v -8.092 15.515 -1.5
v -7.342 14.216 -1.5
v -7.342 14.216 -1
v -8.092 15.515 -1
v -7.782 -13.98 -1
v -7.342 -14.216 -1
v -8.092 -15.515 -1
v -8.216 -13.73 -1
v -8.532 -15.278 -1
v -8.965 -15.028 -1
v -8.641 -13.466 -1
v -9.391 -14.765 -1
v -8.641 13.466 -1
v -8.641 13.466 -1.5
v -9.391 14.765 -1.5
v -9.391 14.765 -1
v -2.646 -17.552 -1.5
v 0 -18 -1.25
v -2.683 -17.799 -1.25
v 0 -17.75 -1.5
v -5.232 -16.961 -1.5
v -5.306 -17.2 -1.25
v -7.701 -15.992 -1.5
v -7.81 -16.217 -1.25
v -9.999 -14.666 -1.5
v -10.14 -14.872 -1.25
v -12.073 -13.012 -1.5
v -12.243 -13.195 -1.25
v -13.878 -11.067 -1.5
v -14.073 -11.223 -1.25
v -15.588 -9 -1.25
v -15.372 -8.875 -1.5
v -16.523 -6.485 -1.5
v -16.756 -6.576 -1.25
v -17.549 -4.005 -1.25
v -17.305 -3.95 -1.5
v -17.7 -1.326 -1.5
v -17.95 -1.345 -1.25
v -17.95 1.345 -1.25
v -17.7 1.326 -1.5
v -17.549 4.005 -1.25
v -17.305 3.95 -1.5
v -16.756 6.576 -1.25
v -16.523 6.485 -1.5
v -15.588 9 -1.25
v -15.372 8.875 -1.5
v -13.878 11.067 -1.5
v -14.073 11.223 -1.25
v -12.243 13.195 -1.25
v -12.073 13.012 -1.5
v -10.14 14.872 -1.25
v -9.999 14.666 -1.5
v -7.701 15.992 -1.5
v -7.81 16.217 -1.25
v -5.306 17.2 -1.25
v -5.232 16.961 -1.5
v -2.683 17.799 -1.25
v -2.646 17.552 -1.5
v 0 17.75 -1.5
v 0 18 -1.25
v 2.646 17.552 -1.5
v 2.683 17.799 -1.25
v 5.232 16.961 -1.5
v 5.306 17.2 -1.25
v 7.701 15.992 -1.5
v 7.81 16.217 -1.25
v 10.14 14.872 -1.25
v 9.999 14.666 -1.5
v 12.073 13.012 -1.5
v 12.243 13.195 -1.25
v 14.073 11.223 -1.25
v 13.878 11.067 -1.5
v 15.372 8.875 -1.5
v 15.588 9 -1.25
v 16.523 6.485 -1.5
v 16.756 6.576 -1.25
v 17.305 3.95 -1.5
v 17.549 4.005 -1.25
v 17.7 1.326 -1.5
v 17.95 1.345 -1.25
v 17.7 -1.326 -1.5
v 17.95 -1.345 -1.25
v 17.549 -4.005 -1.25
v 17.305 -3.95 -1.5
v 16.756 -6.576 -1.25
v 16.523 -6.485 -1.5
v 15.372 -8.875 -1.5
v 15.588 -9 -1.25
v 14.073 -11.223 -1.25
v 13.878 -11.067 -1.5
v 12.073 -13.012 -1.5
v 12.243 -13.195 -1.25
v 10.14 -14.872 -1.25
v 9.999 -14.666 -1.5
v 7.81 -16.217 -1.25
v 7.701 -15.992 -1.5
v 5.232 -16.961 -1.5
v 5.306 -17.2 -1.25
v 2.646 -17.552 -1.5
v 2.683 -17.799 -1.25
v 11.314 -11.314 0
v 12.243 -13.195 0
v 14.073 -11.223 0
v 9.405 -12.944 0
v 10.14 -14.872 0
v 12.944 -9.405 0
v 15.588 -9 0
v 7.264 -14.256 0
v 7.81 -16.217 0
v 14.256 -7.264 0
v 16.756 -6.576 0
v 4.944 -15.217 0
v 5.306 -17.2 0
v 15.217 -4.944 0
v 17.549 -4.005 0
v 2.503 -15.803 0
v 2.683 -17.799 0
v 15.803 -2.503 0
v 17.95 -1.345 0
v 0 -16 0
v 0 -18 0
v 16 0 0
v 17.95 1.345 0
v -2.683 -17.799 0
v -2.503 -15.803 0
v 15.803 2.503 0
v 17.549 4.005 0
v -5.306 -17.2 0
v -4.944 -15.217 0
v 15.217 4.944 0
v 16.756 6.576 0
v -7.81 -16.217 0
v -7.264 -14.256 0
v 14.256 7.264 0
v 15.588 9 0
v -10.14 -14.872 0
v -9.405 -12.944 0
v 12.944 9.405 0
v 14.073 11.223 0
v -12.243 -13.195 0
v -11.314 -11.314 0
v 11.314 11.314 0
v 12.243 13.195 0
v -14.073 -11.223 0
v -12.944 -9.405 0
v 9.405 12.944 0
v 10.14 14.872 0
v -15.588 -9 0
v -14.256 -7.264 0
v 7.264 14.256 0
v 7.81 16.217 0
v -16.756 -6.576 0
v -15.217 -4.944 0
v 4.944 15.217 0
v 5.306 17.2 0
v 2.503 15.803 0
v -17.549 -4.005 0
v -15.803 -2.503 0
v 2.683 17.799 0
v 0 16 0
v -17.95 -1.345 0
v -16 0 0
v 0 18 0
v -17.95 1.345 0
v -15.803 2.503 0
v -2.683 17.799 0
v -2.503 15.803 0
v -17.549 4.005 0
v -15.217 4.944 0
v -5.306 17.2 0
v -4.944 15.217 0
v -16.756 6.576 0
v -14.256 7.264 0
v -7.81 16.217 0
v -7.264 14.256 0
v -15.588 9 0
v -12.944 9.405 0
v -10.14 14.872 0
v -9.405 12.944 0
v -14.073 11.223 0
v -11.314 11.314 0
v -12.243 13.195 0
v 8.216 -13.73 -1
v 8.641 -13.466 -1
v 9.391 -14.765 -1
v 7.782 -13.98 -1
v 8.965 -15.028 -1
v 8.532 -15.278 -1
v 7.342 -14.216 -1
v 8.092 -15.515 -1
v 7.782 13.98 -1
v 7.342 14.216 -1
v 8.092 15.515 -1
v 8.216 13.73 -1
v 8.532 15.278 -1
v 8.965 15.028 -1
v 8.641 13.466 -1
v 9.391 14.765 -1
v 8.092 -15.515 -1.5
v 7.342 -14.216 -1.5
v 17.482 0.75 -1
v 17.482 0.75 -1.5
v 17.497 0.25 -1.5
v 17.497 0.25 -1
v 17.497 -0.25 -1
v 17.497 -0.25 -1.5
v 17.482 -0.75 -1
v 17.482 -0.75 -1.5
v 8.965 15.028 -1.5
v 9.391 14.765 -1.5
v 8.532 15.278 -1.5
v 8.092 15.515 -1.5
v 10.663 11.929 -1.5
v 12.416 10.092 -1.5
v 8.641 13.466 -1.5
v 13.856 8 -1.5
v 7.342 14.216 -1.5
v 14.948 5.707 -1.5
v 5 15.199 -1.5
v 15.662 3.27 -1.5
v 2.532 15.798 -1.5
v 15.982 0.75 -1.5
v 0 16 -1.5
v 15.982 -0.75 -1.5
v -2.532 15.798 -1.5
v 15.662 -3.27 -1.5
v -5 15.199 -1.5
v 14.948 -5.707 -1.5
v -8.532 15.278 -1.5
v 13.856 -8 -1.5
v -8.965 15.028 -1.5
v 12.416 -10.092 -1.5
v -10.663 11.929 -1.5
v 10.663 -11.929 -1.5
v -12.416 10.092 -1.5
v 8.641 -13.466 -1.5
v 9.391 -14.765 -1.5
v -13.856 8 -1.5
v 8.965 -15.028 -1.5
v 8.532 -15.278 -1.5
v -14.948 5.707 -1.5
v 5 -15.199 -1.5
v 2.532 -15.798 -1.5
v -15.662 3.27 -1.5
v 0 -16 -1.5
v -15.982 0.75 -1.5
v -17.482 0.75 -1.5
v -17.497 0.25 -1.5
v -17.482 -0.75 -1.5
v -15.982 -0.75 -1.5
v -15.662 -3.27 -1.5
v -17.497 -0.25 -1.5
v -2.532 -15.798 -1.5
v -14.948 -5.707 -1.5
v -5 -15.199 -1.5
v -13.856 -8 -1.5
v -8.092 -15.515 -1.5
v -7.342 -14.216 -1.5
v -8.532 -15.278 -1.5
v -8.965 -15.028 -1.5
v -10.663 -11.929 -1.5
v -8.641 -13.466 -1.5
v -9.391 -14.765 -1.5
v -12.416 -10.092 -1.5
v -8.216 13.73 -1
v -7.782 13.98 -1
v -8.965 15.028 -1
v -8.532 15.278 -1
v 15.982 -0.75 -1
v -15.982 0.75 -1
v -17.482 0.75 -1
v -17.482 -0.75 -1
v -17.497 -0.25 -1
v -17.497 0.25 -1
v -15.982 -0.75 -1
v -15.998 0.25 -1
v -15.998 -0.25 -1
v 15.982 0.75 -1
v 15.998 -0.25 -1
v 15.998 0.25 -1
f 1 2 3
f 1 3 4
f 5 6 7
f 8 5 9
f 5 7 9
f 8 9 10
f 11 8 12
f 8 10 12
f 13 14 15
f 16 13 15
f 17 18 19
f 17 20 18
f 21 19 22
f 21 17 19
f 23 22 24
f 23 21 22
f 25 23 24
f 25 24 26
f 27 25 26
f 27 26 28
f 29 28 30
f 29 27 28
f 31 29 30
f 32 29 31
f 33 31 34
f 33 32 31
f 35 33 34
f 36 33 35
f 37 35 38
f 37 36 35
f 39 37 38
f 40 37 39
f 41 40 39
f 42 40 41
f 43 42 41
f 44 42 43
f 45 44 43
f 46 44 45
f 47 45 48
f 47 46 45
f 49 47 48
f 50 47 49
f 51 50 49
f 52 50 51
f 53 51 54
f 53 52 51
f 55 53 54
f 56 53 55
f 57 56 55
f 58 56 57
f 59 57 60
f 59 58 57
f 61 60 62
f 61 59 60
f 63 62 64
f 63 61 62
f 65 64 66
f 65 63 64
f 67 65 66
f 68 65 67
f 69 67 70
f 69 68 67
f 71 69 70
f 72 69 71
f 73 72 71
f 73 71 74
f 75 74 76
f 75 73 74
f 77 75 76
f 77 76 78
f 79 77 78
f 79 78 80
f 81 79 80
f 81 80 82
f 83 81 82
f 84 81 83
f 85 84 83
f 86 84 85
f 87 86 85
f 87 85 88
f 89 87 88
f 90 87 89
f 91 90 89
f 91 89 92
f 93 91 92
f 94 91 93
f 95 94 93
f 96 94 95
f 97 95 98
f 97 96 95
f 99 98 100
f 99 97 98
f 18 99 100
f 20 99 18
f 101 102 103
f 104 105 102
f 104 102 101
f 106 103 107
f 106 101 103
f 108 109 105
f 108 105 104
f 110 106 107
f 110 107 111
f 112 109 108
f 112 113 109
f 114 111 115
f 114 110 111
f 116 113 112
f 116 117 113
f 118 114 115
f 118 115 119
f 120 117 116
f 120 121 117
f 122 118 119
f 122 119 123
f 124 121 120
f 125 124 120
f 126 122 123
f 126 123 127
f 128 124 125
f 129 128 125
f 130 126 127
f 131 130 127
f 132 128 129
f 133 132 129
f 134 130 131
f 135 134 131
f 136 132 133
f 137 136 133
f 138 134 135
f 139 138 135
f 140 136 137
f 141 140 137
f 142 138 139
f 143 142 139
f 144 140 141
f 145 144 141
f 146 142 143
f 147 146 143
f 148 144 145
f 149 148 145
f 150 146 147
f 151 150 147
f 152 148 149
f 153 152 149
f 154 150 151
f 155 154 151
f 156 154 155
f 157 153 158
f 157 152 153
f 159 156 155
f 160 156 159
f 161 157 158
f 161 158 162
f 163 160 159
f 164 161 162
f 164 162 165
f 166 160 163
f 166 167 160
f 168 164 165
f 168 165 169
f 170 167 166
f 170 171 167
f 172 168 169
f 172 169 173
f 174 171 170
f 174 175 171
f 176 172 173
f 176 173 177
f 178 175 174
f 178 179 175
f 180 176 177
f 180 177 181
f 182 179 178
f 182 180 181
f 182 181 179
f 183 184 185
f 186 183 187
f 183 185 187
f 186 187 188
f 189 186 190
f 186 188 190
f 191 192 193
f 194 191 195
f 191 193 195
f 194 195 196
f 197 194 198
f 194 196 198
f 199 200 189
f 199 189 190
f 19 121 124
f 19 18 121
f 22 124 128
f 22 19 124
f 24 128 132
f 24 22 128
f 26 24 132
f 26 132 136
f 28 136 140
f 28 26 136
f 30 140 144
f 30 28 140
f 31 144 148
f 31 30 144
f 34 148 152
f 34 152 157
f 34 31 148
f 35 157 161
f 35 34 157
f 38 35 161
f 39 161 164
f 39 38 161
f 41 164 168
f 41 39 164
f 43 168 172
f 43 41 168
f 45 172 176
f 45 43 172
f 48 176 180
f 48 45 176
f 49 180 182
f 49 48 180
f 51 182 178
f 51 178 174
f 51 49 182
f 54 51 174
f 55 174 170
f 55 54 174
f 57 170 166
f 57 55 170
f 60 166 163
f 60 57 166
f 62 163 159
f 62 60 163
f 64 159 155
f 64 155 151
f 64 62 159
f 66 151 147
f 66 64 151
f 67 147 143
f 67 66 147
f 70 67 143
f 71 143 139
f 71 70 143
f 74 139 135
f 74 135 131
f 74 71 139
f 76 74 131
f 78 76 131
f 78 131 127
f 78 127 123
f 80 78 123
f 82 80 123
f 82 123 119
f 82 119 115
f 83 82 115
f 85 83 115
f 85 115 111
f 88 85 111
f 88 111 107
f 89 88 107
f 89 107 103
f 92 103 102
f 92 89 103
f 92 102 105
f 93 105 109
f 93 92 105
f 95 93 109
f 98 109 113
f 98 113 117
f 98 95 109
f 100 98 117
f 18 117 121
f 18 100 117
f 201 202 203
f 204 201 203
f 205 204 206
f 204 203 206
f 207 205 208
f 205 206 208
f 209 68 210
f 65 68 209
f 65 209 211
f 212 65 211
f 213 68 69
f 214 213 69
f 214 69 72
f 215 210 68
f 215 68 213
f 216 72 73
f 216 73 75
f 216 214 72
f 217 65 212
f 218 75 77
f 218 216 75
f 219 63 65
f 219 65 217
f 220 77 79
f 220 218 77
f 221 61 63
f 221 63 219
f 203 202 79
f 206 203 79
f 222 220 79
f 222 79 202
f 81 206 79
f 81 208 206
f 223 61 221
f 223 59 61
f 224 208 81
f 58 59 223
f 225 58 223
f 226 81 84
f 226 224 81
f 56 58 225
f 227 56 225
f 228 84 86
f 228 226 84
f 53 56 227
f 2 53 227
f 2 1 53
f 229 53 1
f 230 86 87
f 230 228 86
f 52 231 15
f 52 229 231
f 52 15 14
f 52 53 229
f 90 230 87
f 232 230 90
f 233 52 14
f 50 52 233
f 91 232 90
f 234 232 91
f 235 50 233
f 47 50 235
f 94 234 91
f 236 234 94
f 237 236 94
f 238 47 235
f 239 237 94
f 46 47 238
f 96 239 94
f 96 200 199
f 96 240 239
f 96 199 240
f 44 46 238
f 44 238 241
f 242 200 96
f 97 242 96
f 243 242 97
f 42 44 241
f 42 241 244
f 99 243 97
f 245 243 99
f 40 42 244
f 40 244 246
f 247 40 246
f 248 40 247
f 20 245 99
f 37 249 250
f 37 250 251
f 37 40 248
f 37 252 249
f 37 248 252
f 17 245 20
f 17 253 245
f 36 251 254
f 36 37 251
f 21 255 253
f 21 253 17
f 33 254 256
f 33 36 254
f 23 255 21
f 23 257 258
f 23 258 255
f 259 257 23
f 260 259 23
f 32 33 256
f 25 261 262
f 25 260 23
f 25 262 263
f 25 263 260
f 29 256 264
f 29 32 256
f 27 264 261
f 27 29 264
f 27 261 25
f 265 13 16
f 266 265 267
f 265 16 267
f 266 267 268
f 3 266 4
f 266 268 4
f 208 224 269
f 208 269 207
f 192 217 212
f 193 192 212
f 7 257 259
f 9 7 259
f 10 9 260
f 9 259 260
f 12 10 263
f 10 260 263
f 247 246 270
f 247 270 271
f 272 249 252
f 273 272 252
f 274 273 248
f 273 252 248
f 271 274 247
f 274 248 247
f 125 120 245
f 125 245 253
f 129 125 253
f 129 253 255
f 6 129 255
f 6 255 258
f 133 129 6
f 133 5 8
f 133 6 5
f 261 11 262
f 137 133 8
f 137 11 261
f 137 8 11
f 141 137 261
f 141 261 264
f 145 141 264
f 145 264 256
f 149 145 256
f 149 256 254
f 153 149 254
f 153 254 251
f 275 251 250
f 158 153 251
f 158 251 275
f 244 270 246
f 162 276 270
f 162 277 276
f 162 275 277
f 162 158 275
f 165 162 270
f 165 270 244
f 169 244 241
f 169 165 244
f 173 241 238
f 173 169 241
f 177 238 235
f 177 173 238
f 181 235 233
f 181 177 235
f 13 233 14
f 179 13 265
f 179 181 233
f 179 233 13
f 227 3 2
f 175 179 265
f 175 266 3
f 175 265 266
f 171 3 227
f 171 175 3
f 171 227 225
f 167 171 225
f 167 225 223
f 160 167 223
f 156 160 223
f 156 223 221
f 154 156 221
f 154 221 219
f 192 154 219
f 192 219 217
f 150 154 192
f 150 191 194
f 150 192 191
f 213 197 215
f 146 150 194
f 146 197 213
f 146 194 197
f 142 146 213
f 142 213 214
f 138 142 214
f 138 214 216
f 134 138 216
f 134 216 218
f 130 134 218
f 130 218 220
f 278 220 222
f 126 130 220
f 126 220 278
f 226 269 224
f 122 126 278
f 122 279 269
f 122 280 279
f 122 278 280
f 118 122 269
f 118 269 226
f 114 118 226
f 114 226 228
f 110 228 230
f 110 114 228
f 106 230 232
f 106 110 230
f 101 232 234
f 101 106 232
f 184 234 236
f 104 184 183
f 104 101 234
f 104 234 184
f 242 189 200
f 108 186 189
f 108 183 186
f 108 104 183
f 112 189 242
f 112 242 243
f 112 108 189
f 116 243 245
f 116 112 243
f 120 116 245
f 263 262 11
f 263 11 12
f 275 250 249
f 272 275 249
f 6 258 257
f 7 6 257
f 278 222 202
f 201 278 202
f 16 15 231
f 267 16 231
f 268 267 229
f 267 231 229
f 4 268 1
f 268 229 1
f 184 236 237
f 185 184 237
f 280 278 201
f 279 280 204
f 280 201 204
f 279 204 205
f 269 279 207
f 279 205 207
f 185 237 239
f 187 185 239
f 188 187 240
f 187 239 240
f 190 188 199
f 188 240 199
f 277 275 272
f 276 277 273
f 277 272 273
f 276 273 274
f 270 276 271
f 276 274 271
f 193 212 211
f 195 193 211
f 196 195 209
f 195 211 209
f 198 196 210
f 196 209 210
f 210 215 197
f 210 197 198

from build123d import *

# Parameters (mm, degrees)
POCKET003_DEPTH         = 0.5
POLARPATTERN_COUNT      = 6
BODY003_PLACEMENT_ANGLE = 180


with BuildPart() as part:
    # Sketch022 → Revolution003 (revolve)
    with BuildSketch(Plane.YZ):
        Polygon((16, 0), (18, 0), (18, 1.25), (17.75, 1.5), (16, 1.5), align=None)
    revolve(axis=Axis((0, 0, 0), (0, 0, 1)))

    # Sketch023 (on Face4 of Revolution003) → Pocket003 (cut)
    with BuildSketch(Plane(origin=(0, 0, 1.5), x_dir=(0, -1, 0), z_dir=(0, 0, 1))):
        with BuildLine():
            Line((-0.75, 15.982412), (-0.75, 17.482412))
            ThreePointArc((0.75, 17.482412), (0, 17.498492), (-0.75, 17.482412))
            Line((0.75, 15.982412), (0.75, 17.482412))
            Line((-0.75, 15.982412), (0.75, 15.982412))
        make_face()
    pocket003 = extrude(amount=-POCKET003_DEPTH, mode=Mode.SUBTRACT)

    # PolarPattern: Pocket003 ×6 about axis
    polarpattern_axis = Axis((0, 0, 1.5), (0, 0, 1))
    for i in range(1, POLARPATTERN_COUNT):
        add(pocket003.rotate(polarpattern_axis, i * 360 / POLARPATTERN_COUNT), mode=Mode.SUBTRACT)


with BuildPart() as part_1:
    # Body003 placement: moved
    add(part.part.moved(Location((0, 0, 0))).rotate(Axis((0, 0, 0), (1, 0, 0)), BODY003_PLACEMENT_ANGLE))


solid = part_1.part
